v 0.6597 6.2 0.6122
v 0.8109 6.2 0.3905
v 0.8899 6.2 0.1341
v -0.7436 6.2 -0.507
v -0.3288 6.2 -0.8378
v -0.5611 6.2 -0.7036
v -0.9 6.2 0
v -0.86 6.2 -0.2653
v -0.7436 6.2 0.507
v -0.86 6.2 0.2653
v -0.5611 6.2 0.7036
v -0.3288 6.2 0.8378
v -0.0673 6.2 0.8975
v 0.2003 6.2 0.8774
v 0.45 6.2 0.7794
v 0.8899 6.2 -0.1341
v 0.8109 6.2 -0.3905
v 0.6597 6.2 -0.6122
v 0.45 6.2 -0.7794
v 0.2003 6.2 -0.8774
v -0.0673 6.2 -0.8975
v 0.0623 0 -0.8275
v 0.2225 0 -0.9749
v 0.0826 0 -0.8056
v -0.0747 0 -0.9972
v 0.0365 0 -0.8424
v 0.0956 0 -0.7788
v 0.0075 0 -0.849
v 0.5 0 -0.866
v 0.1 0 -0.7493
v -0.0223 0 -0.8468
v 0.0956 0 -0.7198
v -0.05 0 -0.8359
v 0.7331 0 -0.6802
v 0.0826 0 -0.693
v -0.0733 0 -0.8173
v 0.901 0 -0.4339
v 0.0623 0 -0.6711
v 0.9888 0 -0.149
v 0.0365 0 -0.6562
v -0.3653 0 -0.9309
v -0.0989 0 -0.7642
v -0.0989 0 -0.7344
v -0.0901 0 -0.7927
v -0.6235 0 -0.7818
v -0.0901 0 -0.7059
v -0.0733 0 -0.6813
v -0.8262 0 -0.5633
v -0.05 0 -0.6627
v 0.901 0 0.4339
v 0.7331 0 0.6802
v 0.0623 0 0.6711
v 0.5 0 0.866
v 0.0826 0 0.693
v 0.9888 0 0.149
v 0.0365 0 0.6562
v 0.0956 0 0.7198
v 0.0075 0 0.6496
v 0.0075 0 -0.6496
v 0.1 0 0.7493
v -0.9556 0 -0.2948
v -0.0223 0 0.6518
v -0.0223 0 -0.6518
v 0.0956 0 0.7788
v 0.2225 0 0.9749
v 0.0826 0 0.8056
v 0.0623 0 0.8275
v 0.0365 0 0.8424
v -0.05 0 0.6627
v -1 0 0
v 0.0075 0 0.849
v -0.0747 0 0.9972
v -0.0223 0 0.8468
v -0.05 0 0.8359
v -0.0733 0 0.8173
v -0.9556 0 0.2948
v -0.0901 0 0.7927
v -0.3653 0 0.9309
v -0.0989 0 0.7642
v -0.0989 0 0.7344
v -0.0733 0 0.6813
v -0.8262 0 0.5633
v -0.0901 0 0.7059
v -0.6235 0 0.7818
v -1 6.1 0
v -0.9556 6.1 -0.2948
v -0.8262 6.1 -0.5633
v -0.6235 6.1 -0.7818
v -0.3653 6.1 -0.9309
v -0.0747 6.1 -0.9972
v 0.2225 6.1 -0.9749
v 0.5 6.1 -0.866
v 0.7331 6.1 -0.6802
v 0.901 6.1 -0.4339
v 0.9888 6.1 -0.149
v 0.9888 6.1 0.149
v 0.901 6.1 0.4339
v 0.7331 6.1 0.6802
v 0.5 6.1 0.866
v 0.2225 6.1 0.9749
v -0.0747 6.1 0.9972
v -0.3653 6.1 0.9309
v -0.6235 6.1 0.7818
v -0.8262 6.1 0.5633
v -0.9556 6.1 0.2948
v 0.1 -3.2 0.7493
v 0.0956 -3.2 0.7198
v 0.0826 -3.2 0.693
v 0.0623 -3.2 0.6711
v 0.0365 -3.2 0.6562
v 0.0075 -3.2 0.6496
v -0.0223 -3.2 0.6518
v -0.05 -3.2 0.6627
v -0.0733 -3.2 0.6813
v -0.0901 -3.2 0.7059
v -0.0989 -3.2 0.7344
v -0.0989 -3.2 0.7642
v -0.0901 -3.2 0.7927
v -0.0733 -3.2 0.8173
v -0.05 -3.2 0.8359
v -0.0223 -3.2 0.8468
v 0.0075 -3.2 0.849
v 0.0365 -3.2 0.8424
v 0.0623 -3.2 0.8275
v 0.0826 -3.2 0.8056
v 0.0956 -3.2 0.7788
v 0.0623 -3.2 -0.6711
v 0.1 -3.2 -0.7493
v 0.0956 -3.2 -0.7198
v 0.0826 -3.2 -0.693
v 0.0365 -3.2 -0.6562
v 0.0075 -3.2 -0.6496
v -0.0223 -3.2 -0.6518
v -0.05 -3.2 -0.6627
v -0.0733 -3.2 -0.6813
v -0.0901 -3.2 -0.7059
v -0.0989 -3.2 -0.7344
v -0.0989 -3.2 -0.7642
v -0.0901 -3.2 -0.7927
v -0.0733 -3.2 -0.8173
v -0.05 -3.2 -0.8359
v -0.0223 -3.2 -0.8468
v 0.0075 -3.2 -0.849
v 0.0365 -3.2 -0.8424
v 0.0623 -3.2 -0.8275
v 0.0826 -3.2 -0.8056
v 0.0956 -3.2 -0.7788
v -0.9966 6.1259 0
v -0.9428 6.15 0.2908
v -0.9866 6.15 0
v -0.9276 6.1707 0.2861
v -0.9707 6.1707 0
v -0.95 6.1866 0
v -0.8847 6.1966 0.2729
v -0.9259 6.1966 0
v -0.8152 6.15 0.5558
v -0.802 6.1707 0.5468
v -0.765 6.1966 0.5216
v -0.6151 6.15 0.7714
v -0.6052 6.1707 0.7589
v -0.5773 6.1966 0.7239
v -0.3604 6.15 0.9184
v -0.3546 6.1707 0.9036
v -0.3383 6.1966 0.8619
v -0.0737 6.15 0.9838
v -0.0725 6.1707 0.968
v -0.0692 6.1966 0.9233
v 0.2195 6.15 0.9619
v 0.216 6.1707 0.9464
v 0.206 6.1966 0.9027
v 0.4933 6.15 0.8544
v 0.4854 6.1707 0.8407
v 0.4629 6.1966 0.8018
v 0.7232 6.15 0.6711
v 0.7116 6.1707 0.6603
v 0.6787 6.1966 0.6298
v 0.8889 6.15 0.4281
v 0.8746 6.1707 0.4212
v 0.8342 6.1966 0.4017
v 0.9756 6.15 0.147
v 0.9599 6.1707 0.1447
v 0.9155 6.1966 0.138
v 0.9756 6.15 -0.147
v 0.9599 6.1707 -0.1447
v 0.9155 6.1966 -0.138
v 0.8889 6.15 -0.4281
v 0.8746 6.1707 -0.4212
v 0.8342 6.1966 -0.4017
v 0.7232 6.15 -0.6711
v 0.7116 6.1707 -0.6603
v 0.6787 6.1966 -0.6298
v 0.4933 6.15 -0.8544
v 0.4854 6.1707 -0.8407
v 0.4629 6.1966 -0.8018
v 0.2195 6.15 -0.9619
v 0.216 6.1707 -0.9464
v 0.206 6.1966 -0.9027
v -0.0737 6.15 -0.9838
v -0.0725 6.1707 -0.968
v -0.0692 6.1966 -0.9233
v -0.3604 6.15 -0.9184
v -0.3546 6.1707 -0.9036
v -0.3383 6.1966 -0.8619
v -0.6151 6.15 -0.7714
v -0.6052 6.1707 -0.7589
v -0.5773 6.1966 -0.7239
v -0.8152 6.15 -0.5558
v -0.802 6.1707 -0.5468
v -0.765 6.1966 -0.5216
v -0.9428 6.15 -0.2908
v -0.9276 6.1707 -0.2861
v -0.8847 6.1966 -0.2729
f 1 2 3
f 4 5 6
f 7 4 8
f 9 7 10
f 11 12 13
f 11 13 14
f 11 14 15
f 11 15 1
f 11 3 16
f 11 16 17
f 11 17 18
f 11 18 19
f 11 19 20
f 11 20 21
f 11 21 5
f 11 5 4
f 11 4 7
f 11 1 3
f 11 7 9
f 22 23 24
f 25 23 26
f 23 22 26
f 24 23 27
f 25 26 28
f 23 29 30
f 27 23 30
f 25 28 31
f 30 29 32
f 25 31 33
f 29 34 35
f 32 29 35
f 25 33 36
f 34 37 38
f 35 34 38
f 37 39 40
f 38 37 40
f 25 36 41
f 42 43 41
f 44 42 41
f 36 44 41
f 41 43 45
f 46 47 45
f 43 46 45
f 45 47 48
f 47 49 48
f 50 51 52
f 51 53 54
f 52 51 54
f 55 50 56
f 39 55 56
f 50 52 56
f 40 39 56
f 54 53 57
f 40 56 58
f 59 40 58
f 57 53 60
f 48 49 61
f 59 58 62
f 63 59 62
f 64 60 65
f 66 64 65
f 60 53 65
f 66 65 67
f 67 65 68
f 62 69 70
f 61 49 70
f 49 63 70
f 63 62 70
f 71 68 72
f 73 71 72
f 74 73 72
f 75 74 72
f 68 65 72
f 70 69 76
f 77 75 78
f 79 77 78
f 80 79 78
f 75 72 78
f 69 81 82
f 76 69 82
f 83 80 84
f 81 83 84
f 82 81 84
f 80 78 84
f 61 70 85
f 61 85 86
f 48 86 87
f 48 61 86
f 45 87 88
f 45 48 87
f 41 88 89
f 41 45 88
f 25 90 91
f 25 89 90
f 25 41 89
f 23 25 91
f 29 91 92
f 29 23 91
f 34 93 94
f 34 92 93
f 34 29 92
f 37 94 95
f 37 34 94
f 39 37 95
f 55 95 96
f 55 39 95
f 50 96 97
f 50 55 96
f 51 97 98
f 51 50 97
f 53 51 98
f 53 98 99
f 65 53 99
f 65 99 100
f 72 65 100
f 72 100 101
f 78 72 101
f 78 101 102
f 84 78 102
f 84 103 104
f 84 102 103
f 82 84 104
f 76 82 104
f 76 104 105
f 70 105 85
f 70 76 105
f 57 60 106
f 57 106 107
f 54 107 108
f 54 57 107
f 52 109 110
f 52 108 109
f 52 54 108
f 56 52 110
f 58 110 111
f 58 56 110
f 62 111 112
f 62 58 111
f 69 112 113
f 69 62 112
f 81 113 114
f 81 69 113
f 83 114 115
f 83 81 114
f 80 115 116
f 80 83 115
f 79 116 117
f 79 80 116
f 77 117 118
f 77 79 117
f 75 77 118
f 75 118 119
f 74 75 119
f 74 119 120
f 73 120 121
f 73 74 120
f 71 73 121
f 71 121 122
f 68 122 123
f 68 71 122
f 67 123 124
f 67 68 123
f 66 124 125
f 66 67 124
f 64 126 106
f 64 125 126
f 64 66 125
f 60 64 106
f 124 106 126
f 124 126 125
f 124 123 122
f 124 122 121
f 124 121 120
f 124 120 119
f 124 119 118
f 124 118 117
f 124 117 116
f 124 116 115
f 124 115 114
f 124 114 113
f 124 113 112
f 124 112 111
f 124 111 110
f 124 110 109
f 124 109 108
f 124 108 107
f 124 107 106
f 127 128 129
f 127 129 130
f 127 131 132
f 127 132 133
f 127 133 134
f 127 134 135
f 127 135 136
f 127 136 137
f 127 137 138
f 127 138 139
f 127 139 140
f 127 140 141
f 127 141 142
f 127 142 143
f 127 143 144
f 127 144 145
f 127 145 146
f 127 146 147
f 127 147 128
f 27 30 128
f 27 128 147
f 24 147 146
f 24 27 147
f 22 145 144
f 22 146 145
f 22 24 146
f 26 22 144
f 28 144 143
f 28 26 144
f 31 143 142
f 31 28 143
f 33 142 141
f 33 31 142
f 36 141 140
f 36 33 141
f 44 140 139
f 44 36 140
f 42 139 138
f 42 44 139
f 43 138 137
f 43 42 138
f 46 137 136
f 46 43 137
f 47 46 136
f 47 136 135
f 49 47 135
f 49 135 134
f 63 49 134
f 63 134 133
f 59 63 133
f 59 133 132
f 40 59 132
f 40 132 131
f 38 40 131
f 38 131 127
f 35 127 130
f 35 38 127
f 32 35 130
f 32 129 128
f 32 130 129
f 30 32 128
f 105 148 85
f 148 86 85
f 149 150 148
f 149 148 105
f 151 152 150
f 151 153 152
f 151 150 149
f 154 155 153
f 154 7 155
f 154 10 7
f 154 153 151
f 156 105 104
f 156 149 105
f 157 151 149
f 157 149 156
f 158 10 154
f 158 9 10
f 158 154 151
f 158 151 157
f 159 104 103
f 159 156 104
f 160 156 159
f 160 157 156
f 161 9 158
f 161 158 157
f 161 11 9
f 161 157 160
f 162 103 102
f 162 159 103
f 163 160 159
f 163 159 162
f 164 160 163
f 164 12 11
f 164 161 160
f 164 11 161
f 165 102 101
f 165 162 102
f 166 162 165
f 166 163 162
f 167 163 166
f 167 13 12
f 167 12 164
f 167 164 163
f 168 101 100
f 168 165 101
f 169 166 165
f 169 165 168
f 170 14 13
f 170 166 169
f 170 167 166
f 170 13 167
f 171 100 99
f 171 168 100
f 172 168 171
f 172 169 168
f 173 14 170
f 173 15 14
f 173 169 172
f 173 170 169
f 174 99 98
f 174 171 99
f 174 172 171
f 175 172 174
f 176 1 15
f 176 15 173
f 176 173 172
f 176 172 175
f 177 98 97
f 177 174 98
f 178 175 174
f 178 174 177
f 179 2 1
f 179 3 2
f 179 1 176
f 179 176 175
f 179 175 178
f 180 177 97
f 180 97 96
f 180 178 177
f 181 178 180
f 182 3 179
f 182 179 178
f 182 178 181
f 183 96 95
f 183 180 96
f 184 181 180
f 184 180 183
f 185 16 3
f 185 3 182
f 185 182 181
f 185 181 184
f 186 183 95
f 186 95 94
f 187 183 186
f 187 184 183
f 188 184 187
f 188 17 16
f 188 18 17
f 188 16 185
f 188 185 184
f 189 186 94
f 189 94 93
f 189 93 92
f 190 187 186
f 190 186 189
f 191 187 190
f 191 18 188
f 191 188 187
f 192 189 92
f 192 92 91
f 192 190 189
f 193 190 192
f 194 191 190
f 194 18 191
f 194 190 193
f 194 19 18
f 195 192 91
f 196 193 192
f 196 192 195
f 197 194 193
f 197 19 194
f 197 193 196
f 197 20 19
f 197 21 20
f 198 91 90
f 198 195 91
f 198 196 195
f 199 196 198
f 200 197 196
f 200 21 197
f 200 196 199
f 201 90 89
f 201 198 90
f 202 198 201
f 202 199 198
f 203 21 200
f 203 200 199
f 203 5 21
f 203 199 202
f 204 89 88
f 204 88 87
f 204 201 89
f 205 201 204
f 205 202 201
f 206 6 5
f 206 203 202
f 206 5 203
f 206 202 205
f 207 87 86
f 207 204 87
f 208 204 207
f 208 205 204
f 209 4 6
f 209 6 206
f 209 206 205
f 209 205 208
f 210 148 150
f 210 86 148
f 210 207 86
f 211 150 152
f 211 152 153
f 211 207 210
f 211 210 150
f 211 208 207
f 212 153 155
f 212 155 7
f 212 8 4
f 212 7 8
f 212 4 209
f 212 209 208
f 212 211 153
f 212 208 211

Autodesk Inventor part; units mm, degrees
ref_plane "YZ Plane" through (0, 0, 0) normal (1, 0, 0) x (0, 1, 0)
ref_plane "XZ Plane" through (0, 0, 0) normal (0, 1, 0) x (-1, 0, 0)
ref_plane "XY Plane" through (0, 0, 0) normal (0, 0, 1) x (1, 0, 0)
sketch "Sketch1" plane through (0, 0, 0) normal (0, 1, 0) x (-1, 0, 0)
  circle A0 centre (0, 0) radius 1
  dimension "d0" = 2
extrude "Extrusion1" add sketch "Sketch1" along normal blind 6.2
fillet "Fillet1" radius 0.1 1 edges at (1, 6.2, 0)
sketch "Sketch2" plane through (0, 0, 0) normal (0, -1, 0) x (1, 0, 0)
  circle A0 centre (0, 0.7493) radius 0.1
  circle A1 centre (0, -0.7493) radius 0.1
  point P0 (0, 0)
  dimension "d4" = 0.2
  dimension "d5" = 0.2
  dimension "d6" = 0.7493
  dimension "d7" = 0.7493
extrude "Extrusion2" add sketch "Sketch2" along normal blind 3.2
properties part number "CFS-20632768EZBB_Watch_Crystal"
